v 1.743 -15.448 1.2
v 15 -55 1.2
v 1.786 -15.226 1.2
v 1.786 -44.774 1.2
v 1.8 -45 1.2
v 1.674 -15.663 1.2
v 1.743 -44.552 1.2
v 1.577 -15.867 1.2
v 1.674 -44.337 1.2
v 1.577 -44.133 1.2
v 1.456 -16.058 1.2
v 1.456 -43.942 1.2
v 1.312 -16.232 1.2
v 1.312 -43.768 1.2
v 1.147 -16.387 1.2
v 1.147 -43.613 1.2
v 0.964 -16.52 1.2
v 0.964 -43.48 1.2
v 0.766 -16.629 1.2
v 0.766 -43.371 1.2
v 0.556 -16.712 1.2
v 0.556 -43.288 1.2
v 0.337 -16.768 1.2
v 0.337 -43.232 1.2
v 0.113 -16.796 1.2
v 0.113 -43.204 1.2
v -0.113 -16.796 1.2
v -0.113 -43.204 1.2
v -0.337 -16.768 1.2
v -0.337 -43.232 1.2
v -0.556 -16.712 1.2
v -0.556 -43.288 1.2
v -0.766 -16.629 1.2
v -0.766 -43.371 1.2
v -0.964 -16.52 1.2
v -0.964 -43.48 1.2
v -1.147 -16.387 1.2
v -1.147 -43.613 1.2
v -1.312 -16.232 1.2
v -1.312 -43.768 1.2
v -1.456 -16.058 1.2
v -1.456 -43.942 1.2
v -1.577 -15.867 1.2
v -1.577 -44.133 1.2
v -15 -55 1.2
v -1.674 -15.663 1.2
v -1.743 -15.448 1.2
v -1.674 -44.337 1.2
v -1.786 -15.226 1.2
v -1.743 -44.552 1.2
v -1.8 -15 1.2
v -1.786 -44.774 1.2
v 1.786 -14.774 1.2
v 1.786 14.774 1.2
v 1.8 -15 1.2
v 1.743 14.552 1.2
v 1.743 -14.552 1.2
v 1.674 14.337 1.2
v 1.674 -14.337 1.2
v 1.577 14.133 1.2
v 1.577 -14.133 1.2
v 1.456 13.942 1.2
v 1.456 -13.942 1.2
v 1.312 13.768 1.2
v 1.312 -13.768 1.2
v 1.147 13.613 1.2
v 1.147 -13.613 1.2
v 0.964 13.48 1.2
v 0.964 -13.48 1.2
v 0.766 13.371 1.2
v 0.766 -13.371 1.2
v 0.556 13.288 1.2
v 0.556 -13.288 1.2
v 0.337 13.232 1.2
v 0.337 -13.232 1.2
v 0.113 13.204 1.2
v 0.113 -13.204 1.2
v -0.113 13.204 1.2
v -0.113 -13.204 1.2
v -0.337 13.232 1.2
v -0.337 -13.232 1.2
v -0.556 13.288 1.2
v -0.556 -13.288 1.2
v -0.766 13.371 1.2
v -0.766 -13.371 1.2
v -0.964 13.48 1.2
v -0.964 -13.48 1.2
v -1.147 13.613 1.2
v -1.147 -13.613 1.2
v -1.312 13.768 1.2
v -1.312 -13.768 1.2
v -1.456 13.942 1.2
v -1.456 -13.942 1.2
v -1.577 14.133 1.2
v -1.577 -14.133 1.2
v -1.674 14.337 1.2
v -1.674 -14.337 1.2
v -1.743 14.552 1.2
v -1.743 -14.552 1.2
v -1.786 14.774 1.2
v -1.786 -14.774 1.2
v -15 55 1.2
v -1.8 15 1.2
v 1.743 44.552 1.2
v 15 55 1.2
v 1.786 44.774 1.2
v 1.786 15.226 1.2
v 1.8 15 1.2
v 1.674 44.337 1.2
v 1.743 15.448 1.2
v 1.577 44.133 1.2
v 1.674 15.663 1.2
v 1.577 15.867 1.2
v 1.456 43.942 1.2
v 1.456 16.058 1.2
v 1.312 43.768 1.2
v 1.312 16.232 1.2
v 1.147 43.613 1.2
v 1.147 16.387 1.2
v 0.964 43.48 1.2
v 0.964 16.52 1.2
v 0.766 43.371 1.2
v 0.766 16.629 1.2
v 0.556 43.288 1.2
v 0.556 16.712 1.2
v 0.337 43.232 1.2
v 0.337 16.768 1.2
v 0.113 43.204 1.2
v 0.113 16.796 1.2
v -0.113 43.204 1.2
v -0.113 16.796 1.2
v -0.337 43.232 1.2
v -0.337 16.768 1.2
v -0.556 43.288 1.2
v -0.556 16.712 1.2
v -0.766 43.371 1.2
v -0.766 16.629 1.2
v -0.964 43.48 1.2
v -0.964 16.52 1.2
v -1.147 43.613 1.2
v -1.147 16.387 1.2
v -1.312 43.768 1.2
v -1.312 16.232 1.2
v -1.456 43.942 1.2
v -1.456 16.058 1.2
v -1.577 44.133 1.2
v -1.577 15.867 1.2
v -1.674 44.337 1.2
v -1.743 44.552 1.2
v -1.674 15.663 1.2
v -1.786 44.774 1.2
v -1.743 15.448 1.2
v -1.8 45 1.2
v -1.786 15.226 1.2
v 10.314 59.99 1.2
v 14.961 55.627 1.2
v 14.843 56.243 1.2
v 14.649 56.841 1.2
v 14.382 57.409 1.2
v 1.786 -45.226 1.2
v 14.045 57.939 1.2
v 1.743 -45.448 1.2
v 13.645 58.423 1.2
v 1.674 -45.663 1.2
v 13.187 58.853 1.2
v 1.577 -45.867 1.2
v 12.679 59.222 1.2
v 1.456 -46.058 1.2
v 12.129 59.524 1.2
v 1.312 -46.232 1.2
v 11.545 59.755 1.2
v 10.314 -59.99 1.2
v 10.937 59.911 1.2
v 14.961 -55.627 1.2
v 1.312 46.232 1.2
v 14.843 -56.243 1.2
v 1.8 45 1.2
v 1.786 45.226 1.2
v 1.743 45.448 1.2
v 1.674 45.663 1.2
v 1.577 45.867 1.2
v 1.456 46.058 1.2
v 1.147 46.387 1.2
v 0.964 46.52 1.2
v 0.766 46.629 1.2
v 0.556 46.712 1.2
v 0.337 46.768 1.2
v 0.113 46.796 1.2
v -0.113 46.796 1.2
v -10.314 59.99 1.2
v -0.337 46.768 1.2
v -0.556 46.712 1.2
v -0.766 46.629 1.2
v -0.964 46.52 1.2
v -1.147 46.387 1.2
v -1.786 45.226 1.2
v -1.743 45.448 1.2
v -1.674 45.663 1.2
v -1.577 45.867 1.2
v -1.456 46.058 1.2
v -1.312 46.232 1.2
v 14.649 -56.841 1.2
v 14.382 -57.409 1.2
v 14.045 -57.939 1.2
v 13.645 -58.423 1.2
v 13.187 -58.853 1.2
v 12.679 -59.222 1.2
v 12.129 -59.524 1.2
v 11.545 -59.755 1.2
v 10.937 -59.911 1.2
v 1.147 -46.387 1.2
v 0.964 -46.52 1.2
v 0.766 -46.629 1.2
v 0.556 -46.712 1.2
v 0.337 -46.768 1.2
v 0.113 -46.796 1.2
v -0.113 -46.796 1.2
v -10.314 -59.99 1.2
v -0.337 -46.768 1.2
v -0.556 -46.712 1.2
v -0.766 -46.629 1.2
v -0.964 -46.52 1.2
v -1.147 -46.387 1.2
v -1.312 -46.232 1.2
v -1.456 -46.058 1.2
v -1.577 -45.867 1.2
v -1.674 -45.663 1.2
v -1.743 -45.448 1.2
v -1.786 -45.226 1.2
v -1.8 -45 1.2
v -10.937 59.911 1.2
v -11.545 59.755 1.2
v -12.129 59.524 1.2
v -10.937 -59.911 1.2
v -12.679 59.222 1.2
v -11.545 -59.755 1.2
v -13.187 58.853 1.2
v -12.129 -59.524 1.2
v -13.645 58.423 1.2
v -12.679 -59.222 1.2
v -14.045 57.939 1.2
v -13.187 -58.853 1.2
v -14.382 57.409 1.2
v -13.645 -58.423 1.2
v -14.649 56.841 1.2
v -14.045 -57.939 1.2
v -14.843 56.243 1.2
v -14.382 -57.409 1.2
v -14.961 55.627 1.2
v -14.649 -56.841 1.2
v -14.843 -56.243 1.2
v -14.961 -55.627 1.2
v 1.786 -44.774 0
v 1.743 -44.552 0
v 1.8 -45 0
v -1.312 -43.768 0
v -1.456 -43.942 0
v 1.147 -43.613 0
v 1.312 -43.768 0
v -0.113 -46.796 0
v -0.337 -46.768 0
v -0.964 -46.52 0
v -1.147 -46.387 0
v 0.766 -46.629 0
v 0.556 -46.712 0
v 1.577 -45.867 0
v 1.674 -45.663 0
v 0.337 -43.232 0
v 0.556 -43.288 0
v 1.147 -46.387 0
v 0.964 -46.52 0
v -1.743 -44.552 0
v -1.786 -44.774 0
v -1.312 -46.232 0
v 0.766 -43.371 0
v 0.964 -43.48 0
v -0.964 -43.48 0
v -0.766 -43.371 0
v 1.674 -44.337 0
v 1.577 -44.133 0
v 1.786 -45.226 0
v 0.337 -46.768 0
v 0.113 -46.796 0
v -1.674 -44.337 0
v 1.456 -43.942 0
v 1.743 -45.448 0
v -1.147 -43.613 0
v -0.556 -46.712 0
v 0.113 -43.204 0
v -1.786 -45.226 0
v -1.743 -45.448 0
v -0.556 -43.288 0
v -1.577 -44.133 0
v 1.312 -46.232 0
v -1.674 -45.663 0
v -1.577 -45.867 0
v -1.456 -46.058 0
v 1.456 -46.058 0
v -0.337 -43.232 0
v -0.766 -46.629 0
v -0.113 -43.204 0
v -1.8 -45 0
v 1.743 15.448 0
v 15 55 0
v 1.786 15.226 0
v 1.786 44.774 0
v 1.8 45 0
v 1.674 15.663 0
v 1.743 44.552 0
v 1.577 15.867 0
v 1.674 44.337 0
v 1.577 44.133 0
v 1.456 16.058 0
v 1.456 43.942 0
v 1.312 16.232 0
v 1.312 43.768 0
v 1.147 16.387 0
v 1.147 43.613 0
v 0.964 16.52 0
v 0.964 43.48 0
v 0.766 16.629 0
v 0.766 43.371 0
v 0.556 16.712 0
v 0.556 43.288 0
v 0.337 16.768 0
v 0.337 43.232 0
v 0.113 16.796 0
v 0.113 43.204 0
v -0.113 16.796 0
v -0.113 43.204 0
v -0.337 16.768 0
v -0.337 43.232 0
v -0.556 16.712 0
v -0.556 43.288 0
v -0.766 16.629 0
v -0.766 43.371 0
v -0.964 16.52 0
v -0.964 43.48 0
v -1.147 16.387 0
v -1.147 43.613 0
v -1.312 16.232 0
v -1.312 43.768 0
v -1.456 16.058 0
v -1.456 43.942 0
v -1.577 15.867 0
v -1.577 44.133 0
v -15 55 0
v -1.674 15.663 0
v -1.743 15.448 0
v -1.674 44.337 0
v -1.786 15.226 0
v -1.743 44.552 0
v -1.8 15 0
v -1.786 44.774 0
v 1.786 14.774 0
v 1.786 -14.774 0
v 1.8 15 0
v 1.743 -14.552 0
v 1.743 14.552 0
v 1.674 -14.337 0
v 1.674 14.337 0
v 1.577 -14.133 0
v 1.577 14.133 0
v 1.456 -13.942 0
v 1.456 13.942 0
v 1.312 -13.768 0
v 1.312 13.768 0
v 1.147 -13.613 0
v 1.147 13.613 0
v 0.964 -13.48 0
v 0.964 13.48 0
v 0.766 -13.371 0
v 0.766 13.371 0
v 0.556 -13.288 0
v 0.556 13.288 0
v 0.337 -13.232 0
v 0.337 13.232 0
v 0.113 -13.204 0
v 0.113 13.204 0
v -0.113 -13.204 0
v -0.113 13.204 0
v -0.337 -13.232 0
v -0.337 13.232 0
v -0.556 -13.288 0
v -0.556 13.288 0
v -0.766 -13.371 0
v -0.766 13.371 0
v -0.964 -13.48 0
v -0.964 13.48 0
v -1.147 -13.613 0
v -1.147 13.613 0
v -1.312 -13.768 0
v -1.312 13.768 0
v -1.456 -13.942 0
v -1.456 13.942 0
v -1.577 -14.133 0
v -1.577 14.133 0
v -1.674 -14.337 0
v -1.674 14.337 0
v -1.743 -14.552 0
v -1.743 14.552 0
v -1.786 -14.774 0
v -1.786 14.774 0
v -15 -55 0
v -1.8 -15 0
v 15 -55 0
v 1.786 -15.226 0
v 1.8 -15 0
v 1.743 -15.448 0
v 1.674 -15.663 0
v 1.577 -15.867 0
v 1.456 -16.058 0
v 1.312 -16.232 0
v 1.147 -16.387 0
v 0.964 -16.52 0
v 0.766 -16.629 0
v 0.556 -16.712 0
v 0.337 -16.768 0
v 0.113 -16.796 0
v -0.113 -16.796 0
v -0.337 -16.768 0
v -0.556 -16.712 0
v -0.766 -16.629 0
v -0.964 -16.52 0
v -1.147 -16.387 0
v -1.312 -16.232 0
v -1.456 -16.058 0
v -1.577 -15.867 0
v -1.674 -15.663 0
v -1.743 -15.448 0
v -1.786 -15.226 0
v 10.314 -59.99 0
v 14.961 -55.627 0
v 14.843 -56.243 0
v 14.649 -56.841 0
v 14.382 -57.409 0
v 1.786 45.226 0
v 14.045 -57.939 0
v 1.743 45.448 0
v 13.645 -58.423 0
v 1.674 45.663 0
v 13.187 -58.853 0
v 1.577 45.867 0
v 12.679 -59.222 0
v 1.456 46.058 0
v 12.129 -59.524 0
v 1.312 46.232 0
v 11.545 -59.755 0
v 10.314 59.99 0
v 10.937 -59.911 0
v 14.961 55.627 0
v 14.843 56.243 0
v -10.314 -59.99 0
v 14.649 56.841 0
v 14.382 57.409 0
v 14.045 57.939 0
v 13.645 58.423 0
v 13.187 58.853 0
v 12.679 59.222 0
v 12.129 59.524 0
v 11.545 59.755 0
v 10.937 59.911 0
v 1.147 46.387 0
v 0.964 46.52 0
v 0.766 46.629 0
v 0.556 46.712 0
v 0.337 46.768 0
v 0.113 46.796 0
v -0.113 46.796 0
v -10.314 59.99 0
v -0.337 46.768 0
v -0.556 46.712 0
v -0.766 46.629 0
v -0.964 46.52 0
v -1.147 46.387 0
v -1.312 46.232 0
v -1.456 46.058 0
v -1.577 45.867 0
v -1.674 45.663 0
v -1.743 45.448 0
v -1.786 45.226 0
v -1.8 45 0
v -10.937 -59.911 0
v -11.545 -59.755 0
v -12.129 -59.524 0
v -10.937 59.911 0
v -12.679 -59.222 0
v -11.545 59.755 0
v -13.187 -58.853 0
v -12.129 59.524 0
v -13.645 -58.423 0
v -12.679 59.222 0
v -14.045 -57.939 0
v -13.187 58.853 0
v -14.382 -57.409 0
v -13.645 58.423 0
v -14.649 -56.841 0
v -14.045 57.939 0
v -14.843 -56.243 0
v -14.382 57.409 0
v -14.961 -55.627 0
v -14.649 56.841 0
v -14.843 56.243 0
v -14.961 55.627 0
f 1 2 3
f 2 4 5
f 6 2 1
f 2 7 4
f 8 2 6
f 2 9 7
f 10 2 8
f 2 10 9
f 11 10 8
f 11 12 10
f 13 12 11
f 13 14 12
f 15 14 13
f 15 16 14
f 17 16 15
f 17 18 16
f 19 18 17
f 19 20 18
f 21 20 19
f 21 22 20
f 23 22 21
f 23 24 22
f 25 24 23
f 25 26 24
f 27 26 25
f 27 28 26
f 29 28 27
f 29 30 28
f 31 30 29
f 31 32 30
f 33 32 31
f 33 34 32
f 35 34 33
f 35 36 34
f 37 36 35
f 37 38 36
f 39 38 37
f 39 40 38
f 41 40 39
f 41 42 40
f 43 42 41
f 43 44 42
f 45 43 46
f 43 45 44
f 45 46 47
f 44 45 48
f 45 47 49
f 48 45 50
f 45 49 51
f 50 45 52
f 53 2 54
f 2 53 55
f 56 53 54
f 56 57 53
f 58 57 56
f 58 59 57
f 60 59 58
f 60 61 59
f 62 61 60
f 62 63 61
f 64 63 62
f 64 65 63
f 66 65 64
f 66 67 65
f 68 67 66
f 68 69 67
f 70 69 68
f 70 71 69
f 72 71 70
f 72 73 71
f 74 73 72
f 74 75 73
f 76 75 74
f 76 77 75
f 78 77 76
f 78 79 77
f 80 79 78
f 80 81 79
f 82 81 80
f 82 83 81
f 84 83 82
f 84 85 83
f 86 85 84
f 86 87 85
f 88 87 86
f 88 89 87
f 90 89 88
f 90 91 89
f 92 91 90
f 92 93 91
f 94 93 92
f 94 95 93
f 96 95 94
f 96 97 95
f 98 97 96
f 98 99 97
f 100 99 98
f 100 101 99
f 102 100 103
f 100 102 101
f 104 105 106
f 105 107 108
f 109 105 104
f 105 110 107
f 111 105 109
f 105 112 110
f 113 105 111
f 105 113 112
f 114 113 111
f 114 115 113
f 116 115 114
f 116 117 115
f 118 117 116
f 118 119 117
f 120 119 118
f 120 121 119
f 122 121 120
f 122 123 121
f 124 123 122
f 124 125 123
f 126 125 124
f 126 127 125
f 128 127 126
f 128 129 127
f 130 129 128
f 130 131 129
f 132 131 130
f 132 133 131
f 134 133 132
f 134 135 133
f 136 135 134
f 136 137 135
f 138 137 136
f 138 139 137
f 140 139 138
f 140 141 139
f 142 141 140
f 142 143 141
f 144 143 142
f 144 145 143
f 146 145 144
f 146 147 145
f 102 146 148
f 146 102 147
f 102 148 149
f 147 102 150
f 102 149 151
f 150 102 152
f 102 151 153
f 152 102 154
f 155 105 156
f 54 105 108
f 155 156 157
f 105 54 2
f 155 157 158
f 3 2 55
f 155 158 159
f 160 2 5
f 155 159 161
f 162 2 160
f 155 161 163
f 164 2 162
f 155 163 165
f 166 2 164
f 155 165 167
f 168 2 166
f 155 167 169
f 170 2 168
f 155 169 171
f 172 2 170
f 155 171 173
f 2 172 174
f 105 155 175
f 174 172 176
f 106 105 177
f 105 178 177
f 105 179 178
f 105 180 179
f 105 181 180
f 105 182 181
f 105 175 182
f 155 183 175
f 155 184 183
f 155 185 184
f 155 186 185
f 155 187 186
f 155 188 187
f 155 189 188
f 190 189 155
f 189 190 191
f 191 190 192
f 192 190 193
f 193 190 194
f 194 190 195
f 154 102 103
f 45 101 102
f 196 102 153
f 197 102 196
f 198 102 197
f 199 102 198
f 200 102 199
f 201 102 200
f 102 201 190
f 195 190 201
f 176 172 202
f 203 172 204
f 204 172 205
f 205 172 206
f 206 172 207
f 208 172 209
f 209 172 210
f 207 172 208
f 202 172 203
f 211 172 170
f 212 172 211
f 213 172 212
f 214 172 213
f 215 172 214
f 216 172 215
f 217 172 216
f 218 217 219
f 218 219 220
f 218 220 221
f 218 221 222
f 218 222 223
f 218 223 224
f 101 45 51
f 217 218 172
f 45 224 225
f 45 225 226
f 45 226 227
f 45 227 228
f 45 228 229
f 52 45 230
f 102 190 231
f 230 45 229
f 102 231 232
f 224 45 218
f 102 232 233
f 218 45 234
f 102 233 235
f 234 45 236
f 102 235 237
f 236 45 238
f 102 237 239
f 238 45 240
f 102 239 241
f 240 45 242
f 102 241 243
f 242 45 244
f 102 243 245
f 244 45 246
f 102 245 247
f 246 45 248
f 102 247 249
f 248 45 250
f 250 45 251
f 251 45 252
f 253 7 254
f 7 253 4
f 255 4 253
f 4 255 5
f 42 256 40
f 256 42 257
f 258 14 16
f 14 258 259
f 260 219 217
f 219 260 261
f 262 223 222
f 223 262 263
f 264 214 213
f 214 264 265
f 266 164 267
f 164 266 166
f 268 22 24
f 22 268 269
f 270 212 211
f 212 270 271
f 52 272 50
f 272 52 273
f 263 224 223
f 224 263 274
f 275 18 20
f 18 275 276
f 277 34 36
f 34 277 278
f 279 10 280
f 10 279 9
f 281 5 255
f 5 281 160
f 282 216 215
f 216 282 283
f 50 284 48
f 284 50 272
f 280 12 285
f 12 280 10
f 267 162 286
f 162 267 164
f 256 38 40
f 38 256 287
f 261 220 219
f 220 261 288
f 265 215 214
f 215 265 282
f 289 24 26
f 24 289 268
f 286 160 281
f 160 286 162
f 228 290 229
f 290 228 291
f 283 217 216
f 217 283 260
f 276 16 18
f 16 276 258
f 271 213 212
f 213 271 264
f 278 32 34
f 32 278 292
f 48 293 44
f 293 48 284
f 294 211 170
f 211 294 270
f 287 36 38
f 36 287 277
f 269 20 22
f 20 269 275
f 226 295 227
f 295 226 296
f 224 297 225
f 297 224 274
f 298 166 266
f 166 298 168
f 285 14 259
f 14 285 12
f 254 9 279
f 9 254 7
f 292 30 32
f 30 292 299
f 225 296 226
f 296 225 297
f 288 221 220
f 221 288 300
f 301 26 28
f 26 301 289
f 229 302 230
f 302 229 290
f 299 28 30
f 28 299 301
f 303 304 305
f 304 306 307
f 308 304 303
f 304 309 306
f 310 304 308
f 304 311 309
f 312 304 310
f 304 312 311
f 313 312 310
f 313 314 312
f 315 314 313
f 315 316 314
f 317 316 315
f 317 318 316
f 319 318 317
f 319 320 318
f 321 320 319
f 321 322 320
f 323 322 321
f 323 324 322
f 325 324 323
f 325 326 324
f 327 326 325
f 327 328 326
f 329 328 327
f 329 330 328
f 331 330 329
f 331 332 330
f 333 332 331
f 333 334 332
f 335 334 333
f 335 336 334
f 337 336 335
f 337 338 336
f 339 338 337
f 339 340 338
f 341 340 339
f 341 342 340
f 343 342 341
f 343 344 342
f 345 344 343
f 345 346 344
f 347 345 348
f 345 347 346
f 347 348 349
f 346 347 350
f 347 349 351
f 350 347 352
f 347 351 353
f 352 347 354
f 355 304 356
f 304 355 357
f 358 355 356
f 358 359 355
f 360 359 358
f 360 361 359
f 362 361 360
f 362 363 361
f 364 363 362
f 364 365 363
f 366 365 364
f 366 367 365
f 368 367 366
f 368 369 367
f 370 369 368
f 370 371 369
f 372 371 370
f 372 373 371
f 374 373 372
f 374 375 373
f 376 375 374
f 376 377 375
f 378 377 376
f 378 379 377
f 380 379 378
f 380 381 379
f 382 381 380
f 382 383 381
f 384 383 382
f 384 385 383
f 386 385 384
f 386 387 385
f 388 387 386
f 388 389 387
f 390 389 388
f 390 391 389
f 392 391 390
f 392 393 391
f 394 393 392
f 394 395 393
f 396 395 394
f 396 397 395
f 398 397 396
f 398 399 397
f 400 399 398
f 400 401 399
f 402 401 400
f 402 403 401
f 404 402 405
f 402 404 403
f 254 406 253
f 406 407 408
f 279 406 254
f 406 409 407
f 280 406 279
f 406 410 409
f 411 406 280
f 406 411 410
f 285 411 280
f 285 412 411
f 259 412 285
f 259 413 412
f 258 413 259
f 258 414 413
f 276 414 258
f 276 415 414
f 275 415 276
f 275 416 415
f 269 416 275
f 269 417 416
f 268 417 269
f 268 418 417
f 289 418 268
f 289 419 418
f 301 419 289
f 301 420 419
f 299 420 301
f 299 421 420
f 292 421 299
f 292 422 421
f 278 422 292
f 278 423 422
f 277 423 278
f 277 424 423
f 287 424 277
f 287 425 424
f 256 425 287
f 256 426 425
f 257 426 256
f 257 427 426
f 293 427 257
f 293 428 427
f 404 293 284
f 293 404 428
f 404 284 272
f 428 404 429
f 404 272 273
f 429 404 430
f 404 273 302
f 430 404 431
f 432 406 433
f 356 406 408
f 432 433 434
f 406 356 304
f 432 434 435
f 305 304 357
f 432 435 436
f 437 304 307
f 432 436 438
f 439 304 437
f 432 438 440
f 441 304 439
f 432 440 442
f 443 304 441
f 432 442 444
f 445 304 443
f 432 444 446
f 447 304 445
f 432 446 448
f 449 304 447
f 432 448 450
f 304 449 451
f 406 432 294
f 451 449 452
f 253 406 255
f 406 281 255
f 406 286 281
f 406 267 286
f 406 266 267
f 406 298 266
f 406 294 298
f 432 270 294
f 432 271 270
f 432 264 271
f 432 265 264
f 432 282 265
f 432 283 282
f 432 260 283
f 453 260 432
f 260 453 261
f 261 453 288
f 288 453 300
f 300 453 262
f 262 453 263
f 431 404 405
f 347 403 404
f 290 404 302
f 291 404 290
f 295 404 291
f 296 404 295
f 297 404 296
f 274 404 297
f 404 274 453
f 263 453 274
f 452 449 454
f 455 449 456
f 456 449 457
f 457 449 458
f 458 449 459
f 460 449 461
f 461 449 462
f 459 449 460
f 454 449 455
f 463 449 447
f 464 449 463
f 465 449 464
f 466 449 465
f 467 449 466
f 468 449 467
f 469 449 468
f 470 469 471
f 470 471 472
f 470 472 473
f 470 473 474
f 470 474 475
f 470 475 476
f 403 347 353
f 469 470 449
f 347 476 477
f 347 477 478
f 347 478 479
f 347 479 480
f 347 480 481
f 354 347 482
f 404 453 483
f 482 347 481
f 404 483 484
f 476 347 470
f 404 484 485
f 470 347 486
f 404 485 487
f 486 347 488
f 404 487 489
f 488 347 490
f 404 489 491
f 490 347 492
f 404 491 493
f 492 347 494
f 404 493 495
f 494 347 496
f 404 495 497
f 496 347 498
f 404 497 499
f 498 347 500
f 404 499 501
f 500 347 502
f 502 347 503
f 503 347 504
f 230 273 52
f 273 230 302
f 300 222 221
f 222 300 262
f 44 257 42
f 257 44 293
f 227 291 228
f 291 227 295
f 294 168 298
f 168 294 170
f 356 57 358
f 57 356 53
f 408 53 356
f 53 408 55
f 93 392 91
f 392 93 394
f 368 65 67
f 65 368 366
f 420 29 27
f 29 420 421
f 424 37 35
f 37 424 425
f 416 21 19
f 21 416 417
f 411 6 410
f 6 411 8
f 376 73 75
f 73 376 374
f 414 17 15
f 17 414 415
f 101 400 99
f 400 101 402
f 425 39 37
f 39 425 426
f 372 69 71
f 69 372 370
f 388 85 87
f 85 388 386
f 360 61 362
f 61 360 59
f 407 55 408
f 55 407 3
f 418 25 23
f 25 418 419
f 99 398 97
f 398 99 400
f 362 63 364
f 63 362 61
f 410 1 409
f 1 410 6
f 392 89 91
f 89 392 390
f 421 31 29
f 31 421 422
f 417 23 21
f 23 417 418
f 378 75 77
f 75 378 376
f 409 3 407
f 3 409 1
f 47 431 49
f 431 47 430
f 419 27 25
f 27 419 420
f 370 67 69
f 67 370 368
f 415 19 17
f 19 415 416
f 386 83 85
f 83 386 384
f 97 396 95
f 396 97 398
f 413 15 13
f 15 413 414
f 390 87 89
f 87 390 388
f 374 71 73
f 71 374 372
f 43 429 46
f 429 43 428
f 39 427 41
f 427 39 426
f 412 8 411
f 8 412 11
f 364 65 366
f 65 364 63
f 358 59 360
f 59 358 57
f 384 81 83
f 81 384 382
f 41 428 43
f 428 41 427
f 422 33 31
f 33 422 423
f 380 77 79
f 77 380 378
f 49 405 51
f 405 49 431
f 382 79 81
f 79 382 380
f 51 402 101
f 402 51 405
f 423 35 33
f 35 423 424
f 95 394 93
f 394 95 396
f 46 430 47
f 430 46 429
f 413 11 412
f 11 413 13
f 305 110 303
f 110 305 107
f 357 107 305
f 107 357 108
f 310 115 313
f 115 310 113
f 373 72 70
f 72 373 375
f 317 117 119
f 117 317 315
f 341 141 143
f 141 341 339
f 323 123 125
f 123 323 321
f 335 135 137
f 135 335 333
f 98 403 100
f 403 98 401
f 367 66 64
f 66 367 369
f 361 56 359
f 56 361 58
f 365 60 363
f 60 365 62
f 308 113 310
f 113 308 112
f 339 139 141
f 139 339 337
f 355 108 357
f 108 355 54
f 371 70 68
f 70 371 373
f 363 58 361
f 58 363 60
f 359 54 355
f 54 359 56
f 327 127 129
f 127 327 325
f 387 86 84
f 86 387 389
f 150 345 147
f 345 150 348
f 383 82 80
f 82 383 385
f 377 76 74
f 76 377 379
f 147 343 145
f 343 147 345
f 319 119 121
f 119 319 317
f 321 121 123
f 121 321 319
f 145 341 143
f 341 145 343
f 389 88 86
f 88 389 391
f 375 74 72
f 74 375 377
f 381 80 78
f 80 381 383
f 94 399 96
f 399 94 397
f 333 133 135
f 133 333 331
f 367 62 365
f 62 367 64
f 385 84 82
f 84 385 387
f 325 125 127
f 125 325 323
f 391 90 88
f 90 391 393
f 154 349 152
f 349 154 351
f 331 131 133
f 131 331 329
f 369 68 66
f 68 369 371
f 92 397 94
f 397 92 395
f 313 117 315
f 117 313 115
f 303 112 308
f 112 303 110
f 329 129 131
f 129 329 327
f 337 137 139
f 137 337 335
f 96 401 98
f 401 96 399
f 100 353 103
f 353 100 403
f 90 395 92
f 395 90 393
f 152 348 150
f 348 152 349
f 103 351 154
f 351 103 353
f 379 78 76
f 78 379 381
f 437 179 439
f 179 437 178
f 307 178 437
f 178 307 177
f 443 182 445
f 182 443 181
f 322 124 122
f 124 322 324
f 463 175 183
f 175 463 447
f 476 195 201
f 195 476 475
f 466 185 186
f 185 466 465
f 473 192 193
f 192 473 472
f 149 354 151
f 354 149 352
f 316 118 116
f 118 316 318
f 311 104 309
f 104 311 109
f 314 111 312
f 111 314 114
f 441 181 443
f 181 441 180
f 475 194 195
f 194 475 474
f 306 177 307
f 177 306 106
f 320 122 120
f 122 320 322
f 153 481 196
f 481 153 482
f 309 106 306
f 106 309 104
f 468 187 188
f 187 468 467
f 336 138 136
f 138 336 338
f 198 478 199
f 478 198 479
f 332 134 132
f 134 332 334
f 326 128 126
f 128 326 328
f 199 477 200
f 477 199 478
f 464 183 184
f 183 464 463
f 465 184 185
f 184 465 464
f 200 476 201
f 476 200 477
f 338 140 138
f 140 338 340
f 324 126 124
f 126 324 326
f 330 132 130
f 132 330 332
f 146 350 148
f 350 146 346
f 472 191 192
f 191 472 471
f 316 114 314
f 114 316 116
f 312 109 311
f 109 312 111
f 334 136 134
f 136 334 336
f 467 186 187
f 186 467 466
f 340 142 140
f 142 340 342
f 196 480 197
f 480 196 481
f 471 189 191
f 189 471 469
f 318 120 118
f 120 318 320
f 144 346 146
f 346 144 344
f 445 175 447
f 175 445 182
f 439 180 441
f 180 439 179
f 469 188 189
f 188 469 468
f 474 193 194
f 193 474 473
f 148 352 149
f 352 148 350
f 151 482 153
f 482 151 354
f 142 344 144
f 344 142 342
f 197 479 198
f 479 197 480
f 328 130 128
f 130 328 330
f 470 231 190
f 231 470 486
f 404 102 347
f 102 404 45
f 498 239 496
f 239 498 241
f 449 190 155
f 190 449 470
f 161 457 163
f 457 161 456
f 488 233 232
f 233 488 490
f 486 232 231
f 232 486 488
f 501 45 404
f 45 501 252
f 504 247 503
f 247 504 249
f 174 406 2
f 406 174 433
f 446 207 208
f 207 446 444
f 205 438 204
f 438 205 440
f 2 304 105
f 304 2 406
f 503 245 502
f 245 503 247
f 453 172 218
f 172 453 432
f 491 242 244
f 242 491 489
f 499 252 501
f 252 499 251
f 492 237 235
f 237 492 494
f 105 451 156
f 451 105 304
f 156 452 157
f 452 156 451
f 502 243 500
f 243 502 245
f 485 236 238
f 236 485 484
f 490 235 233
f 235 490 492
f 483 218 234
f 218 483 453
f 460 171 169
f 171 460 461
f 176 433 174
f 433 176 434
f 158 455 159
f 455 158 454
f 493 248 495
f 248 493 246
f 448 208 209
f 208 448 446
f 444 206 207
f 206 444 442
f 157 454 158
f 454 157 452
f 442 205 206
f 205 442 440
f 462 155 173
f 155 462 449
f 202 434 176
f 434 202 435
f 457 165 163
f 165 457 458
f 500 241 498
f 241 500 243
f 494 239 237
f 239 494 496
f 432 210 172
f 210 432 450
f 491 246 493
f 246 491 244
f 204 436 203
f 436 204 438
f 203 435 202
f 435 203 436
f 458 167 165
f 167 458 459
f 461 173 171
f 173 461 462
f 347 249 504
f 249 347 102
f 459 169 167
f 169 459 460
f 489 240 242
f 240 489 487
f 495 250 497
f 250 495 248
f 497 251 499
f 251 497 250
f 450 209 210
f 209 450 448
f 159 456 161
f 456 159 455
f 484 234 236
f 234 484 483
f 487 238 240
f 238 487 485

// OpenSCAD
$fn = 50;


difference() {
	union() {
		hull() {
			translate(v = [-10.0000000000, 55.0000000000, 0]) {
				cylinder(h = 45, r = 5);
			}
			translate(v = [10.0000000000, 55.0000000000, 0]) {
				cylinder(h = 45, r = 5);
			}
			translate(v = [-10.0000000000, -55.0000000000, 0]) {
				cylinder(h = 45, r = 5);
			}
			translate(v = [10.0000000000, -55.0000000000, 0]) {
				cylinder(h = 45, r = 5);
			}
		}
	}
	union() {
		translate(v = [0, 0, 1.2000000000]) {
			hull() {
				translate(v = [-10.0000000000, 55.0000000000, 0]) {
					cylinder(h = 43.8000000000, r = 3.8000000000);
				}
				translate(v = [10.0000000000, 55.0000000000, 0]) {
					cylinder(h = 43.8000000000, r = 3.8000000000);
				}
				translate(v = [-10.0000000000, -55.0000000000, 0]) {
					cylinder(h = 43.8000000000, r = 3.8000000000);
				}
				translate(v = [10.0000000000, -55.0000000000, 0]) {
					cylinder(h = 43.8000000000, r = 3.8000000000);
				}
			}
		}
		#translate(v = [0.0000000000, -45.0000000000, 0]) {
			cylinder(h = 1.2000000000, r = 1.8000000000);
		}
		#translate(v = [0.0000000000, -15.0000000000, 0]) {
			cylinder(h = 1.2000000000, r = 1.8000000000);
		}
		#translate(v = [0.0000000000, 15.0000000000, 0]) {
			cylinder(h = 1.2000000000, r = 1.8000000000);
		}
		#translate(v = [0.0000000000, 45.0000000000, 0]) {
			cylinder(h = 1.2000000000, r = 1.8000000000);
		}
		translate(v = [-250.0000000000, -250.0000000000, 1.2000000000]) {
			cube(size = [500, 500, 500]);
		}
		translate(v = [-250.0000000000, -250.0000000000, 1.2000000000]) {
			cube(size = [500, 500, 500]);
		}
		translate(v = [-250.0000000000, -250.0000000000, 1.2000000000]) {
			cube(size = [500, 500, 500]);
		}
	}
}
